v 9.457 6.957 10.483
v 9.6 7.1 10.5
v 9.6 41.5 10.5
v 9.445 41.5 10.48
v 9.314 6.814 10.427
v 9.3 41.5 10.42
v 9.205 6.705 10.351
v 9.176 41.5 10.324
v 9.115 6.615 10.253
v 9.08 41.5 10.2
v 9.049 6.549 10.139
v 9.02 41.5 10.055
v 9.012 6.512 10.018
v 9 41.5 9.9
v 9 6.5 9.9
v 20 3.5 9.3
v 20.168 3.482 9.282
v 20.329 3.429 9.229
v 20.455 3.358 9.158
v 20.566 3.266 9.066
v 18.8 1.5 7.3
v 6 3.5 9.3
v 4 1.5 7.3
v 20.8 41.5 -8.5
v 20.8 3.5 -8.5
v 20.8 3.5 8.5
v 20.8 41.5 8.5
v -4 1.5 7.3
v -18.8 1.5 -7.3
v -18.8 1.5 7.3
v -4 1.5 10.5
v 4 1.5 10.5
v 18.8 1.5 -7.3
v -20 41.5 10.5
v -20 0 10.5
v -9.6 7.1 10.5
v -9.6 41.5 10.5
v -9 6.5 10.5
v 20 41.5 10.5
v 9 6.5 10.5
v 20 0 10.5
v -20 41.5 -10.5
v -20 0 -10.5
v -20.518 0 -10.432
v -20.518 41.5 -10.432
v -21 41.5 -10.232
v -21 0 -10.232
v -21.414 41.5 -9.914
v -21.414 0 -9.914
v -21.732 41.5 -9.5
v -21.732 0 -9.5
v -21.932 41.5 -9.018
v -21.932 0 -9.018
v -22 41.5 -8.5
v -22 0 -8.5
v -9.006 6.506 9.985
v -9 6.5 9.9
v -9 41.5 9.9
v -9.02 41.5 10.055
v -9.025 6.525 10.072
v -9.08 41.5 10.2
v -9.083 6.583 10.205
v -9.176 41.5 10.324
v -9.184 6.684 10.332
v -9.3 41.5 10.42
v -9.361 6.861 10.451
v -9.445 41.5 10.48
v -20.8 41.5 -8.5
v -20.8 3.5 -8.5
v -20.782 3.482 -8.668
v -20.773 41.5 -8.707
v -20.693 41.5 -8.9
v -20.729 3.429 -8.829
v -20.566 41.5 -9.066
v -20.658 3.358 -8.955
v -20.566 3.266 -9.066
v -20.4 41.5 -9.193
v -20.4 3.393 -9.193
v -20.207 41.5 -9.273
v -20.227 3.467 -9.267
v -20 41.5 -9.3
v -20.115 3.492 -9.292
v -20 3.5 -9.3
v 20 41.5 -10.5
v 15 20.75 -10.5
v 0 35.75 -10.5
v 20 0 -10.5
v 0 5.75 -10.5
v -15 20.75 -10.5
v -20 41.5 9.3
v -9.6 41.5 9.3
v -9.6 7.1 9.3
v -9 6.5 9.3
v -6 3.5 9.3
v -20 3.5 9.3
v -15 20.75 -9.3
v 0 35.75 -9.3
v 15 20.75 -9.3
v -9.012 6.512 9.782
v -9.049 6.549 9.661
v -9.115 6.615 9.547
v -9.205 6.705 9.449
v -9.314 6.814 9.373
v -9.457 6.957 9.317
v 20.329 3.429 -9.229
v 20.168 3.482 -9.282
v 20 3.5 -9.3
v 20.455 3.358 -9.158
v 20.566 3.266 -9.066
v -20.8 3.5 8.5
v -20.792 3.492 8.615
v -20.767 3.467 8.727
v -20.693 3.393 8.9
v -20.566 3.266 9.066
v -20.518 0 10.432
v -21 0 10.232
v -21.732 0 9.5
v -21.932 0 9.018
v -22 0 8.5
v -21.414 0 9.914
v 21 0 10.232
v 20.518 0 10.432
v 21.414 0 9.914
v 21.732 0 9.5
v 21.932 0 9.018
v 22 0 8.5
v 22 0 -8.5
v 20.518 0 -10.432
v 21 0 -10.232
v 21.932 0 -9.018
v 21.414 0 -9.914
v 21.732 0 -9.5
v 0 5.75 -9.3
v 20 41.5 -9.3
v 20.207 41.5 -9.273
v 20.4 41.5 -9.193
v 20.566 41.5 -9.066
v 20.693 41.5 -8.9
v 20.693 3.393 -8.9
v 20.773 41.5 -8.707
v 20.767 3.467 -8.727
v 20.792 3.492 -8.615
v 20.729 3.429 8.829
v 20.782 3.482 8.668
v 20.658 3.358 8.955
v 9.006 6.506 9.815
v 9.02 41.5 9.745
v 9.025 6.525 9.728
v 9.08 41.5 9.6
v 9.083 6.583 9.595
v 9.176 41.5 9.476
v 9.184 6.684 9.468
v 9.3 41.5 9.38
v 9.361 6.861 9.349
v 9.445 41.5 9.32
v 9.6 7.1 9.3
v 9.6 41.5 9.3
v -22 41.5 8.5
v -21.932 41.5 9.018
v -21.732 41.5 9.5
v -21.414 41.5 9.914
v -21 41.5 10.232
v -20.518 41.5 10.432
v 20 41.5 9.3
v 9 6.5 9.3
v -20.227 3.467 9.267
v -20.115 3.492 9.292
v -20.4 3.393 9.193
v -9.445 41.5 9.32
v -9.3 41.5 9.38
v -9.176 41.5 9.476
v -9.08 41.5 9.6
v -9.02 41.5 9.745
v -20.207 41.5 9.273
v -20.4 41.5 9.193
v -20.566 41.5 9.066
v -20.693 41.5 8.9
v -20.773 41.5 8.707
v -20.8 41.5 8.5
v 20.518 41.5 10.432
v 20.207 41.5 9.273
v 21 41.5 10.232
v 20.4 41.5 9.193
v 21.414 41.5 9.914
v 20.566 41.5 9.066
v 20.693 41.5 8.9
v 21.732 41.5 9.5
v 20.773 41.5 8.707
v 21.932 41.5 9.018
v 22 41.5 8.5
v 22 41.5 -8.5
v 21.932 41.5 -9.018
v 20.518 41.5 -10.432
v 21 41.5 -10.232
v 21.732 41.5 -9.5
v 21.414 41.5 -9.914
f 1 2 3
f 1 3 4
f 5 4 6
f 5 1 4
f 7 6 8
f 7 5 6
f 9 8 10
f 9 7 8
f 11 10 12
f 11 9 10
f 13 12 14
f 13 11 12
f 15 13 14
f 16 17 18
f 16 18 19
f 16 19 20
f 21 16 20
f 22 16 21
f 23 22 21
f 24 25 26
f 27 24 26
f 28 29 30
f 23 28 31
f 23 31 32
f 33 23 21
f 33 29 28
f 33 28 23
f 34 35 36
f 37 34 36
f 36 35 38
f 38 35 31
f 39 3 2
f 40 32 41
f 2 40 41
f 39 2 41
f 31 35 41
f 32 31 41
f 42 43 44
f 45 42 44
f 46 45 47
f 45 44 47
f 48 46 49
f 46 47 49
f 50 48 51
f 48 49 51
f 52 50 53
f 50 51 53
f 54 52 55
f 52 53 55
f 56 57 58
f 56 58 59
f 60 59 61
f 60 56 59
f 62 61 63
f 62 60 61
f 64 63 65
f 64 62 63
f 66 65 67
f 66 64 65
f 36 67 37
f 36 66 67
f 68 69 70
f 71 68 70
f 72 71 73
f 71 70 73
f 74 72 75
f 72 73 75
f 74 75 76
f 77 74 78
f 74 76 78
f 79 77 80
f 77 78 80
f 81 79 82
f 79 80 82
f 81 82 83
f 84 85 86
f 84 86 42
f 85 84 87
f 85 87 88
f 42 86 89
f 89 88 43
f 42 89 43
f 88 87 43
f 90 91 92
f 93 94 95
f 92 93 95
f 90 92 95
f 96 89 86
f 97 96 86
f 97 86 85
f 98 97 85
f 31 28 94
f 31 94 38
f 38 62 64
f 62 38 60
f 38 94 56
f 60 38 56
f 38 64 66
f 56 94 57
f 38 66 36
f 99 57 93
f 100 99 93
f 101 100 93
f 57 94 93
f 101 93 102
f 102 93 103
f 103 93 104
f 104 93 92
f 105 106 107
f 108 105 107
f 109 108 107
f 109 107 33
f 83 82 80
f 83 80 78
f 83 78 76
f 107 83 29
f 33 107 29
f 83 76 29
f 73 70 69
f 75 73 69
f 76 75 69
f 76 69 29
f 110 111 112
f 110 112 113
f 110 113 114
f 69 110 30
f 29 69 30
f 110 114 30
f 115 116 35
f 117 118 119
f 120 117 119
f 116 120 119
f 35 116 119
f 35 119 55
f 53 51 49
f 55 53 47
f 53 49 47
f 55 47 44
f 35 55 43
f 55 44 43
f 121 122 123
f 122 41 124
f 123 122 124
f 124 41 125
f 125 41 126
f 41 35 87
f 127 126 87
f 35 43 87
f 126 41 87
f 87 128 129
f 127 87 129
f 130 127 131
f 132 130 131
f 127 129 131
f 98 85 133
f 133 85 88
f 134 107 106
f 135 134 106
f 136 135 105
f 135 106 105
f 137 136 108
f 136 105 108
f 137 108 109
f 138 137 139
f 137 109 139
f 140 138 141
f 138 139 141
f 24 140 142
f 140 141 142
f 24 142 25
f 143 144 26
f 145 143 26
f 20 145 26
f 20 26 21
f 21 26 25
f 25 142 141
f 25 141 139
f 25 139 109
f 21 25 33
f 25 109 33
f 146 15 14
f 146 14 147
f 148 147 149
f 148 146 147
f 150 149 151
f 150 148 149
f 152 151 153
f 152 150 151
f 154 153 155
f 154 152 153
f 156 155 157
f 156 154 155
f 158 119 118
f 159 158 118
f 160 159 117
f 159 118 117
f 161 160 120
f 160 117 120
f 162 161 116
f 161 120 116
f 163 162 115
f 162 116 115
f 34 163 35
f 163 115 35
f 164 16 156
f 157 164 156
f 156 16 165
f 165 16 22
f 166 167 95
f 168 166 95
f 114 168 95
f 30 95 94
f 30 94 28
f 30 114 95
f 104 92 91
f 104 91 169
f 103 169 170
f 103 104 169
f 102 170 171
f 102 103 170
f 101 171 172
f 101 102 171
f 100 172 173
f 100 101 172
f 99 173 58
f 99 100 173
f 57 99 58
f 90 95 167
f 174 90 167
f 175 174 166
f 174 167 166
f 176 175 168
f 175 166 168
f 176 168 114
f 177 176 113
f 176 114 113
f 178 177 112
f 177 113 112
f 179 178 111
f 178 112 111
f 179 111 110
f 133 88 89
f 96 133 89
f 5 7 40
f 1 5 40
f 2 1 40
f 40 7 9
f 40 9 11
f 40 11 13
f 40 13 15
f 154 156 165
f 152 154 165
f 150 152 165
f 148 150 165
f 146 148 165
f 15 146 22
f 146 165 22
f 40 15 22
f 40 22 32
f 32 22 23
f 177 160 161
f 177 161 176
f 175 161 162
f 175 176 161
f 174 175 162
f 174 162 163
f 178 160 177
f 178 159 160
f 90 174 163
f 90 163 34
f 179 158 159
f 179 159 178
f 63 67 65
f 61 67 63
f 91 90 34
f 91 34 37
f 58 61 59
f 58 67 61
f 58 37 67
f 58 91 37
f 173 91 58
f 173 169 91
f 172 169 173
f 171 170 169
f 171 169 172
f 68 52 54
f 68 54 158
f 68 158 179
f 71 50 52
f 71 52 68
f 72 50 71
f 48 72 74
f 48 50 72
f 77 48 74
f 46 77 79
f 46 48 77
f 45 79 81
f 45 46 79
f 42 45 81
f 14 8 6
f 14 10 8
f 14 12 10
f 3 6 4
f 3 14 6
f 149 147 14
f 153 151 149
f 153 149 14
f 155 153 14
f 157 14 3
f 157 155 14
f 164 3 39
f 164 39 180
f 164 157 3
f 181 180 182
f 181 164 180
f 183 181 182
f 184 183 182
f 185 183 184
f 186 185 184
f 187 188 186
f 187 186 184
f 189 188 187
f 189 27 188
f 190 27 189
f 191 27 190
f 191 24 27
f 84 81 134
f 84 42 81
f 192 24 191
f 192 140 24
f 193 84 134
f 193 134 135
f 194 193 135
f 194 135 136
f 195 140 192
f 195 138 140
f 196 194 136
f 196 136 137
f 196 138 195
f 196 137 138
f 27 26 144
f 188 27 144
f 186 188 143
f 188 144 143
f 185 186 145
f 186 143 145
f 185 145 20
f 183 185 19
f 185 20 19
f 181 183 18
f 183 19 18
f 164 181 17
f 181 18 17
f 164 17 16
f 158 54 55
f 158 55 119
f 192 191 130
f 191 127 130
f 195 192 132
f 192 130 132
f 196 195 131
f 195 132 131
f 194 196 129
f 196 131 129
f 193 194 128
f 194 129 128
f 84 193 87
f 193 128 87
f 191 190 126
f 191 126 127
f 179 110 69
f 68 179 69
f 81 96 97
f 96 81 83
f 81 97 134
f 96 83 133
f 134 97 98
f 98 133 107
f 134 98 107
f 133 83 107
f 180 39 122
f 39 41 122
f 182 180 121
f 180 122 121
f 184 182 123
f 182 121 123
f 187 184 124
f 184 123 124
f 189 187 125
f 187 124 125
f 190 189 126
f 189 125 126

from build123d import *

# Parameters (mm, degrees)
RESSALTO_EXTRUS_O1_DEPTH = 1.5
RESSALTO_EXTRUS_O2_DEPTH = 40
ESBO_O4_W                = 18
ESBO_O4_H                = 3
CORTE_EXTRUS_O1_DEPTH    = 40
CORTE_EXTRUS_O2_DEPTH    = 8
CHANFRO1_SIZE            = 5
CHANFRO2_SIZE            = 2
FILETE2_START            = 6.5
FILETE2_DEPTH            = 35.5
FILETE2_START_2          = -3
FILETE2_2_DEPTH          = 1.232233047
FILETE3_START            = 6.5
FILETE3_DEPTH            = 35.5
FILETE3_START_2          = 1.767766953
FILETE3_2_DEPTH          = 1.232233047


with BuildPart() as part:
    # Esboço1 → Ressalto-extrusão1 (new body)
    with BuildSketch(Plane(origin=(0, 0, 0), x_dir=(1, 0, 0), z_dir=(0, 1, 0))):
        with BuildLine():
            Line((-20, -10.5), (20, -10.5))
            ThreePointArc((20, -10.5), (21.414213562, -9.914213562), (22, -8.5))
            Line((22, -8.5), (22, 8.5))
            ThreePointArc((22, 8.5), (21.414213562, 9.914213562), (20, 10.5))
            Line((20, 10.5), (-20, 10.5))
            ThreePointArc((-20, 10.5), (-21.414213562, 9.914213562), (-22, 8.5))
            Line((-22, 8.5), (-22, -8.5))
            ThreePointArc((-22, -8.5), (-21.414213562, -9.914213562), (-20, -10.5))
        make_face()
    extrude(amount=RESSALTO_EXTRUS_O1_DEPTH)

    # Esboço3 → Ressalto-extrusão2 (add)
    with BuildSketch(Plane(origin=(0, 1.5, 0), x_dir=(1, 0, 0), z_dir=(0, 1, 0))):
        with BuildLine():
            Line((-20, -10.5), (20, -10.5))
            ThreePointArc((20, -10.5), (21.414213562, -9.914213562), (22, -8.5))
            Line((22, -8.5), (22, 8.5))
            ThreePointArc((22, 8.5), (21.414213562, 9.914213562), (20, 10.5))
            Line((20, 10.5), (-20, 10.5))
            ThreePointArc((-20, 10.5), (-21.414213562, 9.914213562), (-22, 8.5))
            Line((-22, 8.5), (-22, -8.5))
            ThreePointArc((-22, -8.5), (-21.414213562, -9.914213562), (-20, -10.5))
        make_face()
        with BuildLine():
            Line((-20, 9.3), (20, 9.3))
            ThreePointArc((20, 9.3), (20.565685425, 9.065685425), (20.8, 8.5))
            Line((20.8, 8.5), (20.8, -8.5))
            ThreePointArc((20.8, -8.5), (20.565685425, -9.065685425), (20, -9.3))
            Line((20, -9.3), (-20, -9.3))
            ThreePointArc((-20, -9.3), (-20.565685425, -9.065685425), (-20.8, -8.5))
            Line((-20.8, -8.5), (-20.8, 8.5))
            ThreePointArc((-20.8, 8.5), (-20.565685425, 9.065685425), (-20, 9.3))
        make_face(mode=Mode.SUBTRACT)
    extrude(amount=RESSALTO_EXTRUS_O2_DEPTH)

    # Esboço4 → Corte-extrusão1 (cut)
    with BuildSketch(Plane(origin=(0, 41.5, 0), x_dir=(1, 0, 0), z_dir=(0, 1, 0))):
        with Locations((0, -9.3)):
            Rectangle(ESBO_O4_W, ESBO_O4_H)
    extrude(amount=-CORTE_EXTRUS_O1_DEPTH, mode=Mode.SUBTRACT)

    # Esboço5 → Corte-extrusão2 (cut)
    with BuildSketch(Plane(origin=(0, 0, -10.5), x_dir=(-1, 0, 0), z_dir=(0, 0, -1))):
        Polygon((0, 5.75), (15, 20.75), (0, 35.75), (-15, 20.75), align=None)
    extrude(amount=-CORTE_EXTRUS_O2_DEPTH, mode=Mode.SUBTRACT)

    # Chanfro1
    chanfro1_edges = [part.edges().sort_by_distance(p)[0] for p in [
        (9, 1.5, 9.9),
        (-9, 1.5, 9.9),
    ]]
    chamfer(chanfro1_edges, length=CHANFRO1_SIZE)

    # Chanfro2
    # the kernel refuses this chamfer: 2 mm, written as the material it adds along each edge
    with BuildSketch(Plane(origin=(-1.143365976, 1.5, 9.3), x_dir=(0, 1, 0), z_dir=(1, 0, 0))) as chanfro2_piece_1_section:
        Polygon((CHANFRO2_SIZE, 0), (0, -CHANFRO2_SIZE), (0, 0), align=None)
    chanfro2_piece_1 = extrude(amount=26.286731952, mode=Mode.PRIVATE)
    chanfro2_piece_1 = split(chanfro2_piece_1, bisect_by=Plane(origin=(20.8, 1.5, 9.3), z_dir=(-1, 0, 0)), keep=Keep.TOP, mode=Mode.PRIVATE)
    chanfro2_piece_1 = split(chanfro2_piece_1, bisect_by=Plane(origin=(1.428317012, -1.071682988, 9.3), z_dir=(0.7071067811865476, -0.7071067811865476, 0)), keep=Keep.TOP, mode=Mode.PRIVATE)
    add(chanfro2_piece_1)
    with BuildSketch(Plane(origin=(20.8, 1.5, -13.643365976), x_dir=(0, 1, 0), z_dir=(0, 0, 1))) as chanfro2_piece_2_section:
        Polygon((CHANFRO2_SIZE, 0), (0, CHANFRO2_SIZE), (0, 0), align=None)
    chanfro2_piece_2 = extrude(amount=27.286731952, mode=Mode.PRIVATE)
    chanfro2_piece_2 = split(chanfro2_piece_2, bisect_by=Plane(origin=(20.8, 1.5, -9.3), z_dir=(0, 0, 1)), keep=Keep.TOP, mode=Mode.PRIVATE)
    chanfro2_piece_2 = split(chanfro2_piece_2, bisect_by=Plane(origin=(20.8, 1.5, 9.3), z_dir=(0, 0, -1)), keep=Keep.TOP, mode=Mode.PRIVATE)
    add(chanfro2_piece_2)
    with BuildSketch(Plane(origin=(-25.143365976, 1.5, 9.3), x_dir=(0, 1, 0), z_dir=(1, 0, 0))) as chanfro2_piece_3_section:
        Polygon((CHANFRO2_SIZE, 0), (0, -CHANFRO2_SIZE), (0, 0), align=None)
    chanfro2_piece_3 = extrude(amount=26.286731952, mode=Mode.PRIVATE)
    chanfro2_piece_3 = split(chanfro2_piece_3, bisect_by=Plane(origin=(-20.8, 1.5, 9.3), z_dir=(1, 0, 0)), keep=Keep.TOP, mode=Mode.PRIVATE)
    chanfro2_piece_3 = split(chanfro2_piece_3, bisect_by=Plane(origin=(-14.571682988, 12.071682988, 9.3), z_dir=(-0.7071067811865476, -0.7071067811865476, 0)), keep=Keep.TOP, mode=Mode.PRIVATE)
    add(chanfro2_piece_3)
    with BuildSketch(Plane(origin=(-20.8, 1.5, 13.643365976), x_dir=(0, 1, 0), z_dir=(0, 0, -1))) as chanfro2_piece_4_section:
        Polygon((CHANFRO2_SIZE, 0), (0, CHANFRO2_SIZE), (0, 0), align=None)
    chanfro2_piece_4 = extrude(amount=27.286731952, mode=Mode.PRIVATE)
    chanfro2_piece_4 = split(chanfro2_piece_4, bisect_by=Plane(origin=(-20.8, 1.5, -9.3), z_dir=(0, 0, 1)), keep=Keep.TOP, mode=Mode.PRIVATE)
    chanfro2_piece_4 = split(chanfro2_piece_4, bisect_by=Plane(origin=(-20.8, 1.5, 9.3), z_dir=(0, 0, -1)), keep=Keep.TOP, mode=Mode.PRIVATE)
    add(chanfro2_piece_4)
    with BuildSketch(Plane(origin=(-25.143365976, 1.5, -9.3), x_dir=(0, 1, 0), z_dir=(1, 0, 0))) as chanfro2_piece_5_section:
        Polygon((CHANFRO2_SIZE, 0), (0, CHANFRO2_SIZE), (0, 0), align=None)
    chanfro2_piece_5 = extrude(amount=50.286731952, mode=Mode.PRIVATE)
    chanfro2_piece_5 = split(chanfro2_piece_5, bisect_by=Plane(origin=(20.8, 1.5, -9.3), z_dir=(-1, 0, 0)), keep=Keep.TOP, mode=Mode.PRIVATE)
    chanfro2_piece_5 = split(chanfro2_piece_5, bisect_by=Plane(origin=(-20.8, 1.5, -9.3), z_dir=(1, 0, 0)), keep=Keep.TOP, mode=Mode.PRIVATE)
    add(chanfro2_piece_5)
    with BuildSketch(Plane(origin=(-20, 1.5, -8.5), x_dir=(-1, 0, 0), z_dir=(0, 0, 1))) as chanfro2_piece_6_section:
        Polygon((0.8, -CHANFRO2_SIZE), (0, -1.2), (0, 0), (0.8, 0), align=None)
    chanfro2_piece_6 = revolve(axis=Axis((-20, 1.5, -8.5), (0, -1, 0)), revolution_arc=90, mode=Mode.PRIVATE)
    chanfro2_piece_6 = split(chanfro2_piece_6, bisect_by=Plane(origin=(-19.4, 2.1, -8.5), z_dir=(-0.7071067811865476, -0.7071067811865476, 0)), keep=Keep.TOP, mode=Mode.PRIVATE)
    add(chanfro2_piece_6)
    with BuildSketch(Plane(origin=(-20, 1.5, -8.5), x_dir=(-1, 0, 0), z_dir=(0, 0, 1))) as chanfro2_piece_7_section:
        Polygon((0.8, -CHANFRO2_SIZE), (0, -1.2), (0, 0), (0.8, 0), align=None)
    chanfro2_piece_7 = revolve(axis=Axis((-20, 1.5, -8.5), (0, -1, 0)), revolution_arc=90, mode=Mode.PRIVATE)
    chanfro2_piece_7 = split(chanfro2_piece_7, bisect_by=Plane(origin=(-20, 2.1, -7.9), z_dir=(0, -0.7071067811865476, -0.7071067811865476)), keep=Keep.TOP, mode=Mode.PRIVATE)
    add(chanfro2_piece_7)
    with BuildSketch(Plane(origin=(20, 1.5, -8.5), x_dir=(0, 0, -1), z_dir=(-1, 0, 0))) as chanfro2_piece_8_section:
        Polygon((0.8, -CHANFRO2_SIZE), (0, -1.2), (0, 0), (0.8, 0), align=None)
    chanfro2_piece_8 = revolve(axis=Axis((20, 1.5, -8.5), (0, -1, 0)), revolution_arc=90, mode=Mode.PRIVATE)
    chanfro2_piece_8 = split(chanfro2_piece_8, bisect_by=Plane(origin=(20, 2.1, -7.9), z_dir=(0, -0.7071067811865476, -0.7071067811865476)), keep=Keep.TOP, mode=Mode.PRIVATE)
    add(chanfro2_piece_8)
    with BuildSketch(Plane(origin=(20, 1.5, -8.5), x_dir=(0, 0, -1), z_dir=(-1, 0, 0))) as chanfro2_piece_9_section:
        Polygon((0.8, -CHANFRO2_SIZE), (0, -1.2), (0, 0), (0.8, 0), align=None)
    chanfro2_piece_9 = revolve(axis=Axis((20, 1.5, -8.5), (0, -1, 0)), revolution_arc=90, mode=Mode.PRIVATE)
    chanfro2_piece_9 = split(chanfro2_piece_9, bisect_by=Plane(origin=(19.4, 2.1, -8.5), z_dir=(0.7071067811865476, -0.7071067811865476, 0)), keep=Keep.TOP, mode=Mode.PRIVATE)
    add(chanfro2_piece_9)
    with BuildSketch(Plane(origin=(-20, 1.5, 8.5), x_dir=(0, 0, 1), z_dir=(1, 0, 0))) as chanfro2_piece_10_section:
        Polygon((0.8, -CHANFRO2_SIZE), (0, -1.2), (0, 0), (0.8, 0), align=None)
    chanfro2_piece_10 = revolve(axis=Axis((-20, 1.5, 8.5), (0, -1, 0)), revolution_arc=90, mode=Mode.PRIVATE)
    chanfro2_piece_10 = split(chanfro2_piece_10, bisect_by=Plane(origin=(-20, 2.1, 7.9), z_dir=(0, -0.7071067811865476, 0.7071067811865476)), keep=Keep.TOP, mode=Mode.PRIVATE)
    add(chanfro2_piece_10)
    with BuildSketch(Plane(origin=(-20, 1.5, 8.5), x_dir=(0, 0, 1), z_dir=(1, 0, 0))) as chanfro2_piece_11_section:
        Polygon((0.8, -CHANFRO2_SIZE), (0, -1.2), (0, 0), (0.8, 0), align=None)
    chanfro2_piece_11 = revolve(axis=Axis((-20, 1.5, 8.5), (0, -1, 0)), revolution_arc=90, mode=Mode.PRIVATE)
    chanfro2_piece_11 = split(chanfro2_piece_11, bisect_by=Plane(origin=(-19.4, 2.1, 8.5), z_dir=(-0.7071067811865476, -0.7071067811865476, 0)), keep=Keep.TOP, mode=Mode.PRIVATE)
    add(chanfro2_piece_11)
    with BuildSketch(Plane(origin=(20, 1.5, 8.5), x_dir=(1, 0, 0), z_dir=(0, 0, -1))) as chanfro2_piece_12_section:
        Polygon((0.8, -CHANFRO2_SIZE), (0, -1.2), (0, 0), (0.8, 0), align=None)
    chanfro2_piece_12 = revolve(axis=Axis((20, 1.5, 8.5), (0, -1, 0)), revolution_arc=90, mode=Mode.PRIVATE)
    chanfro2_piece_12 = split(chanfro2_piece_12, bisect_by=Plane(origin=(19.4, 2.1, 8.5), z_dir=(0.7071067811865476, -0.7071067811865476, 0)), keep=Keep.TOP, mode=Mode.PRIVATE)
    add(chanfro2_piece_12)
    with BuildSketch(Plane(origin=(20, 1.5, 8.5), x_dir=(1, 0, 0), z_dir=(0, 0, -1))) as chanfro2_piece_13_section:
        Polygon((0.8, -CHANFRO2_SIZE), (0, -1.2), (0, 0), (0.8, 0), align=None)
    chanfro2_piece_13 = revolve(axis=Axis((20, 1.5, 8.5), (0, -1, 0)), revolution_arc=90, mode=Mode.PRIVATE)
    chanfro2_piece_13 = split(chanfro2_piece_13, bisect_by=Plane(origin=(20, 2.1, 7.9), z_dir=(0, -0.7071067811865476, 0.7071067811865476)), keep=Keep.TOP, mode=Mode.PRIVATE)
    add(chanfro2_piece_13)

    # Filete2: read off the stored shape, not the designer's step
    # Filete2 outline → Filete2 (cut)
    with BuildSketch(Plane(origin=(0, 0, 0), x_dir=(1, 0, 0), z_dir=(0, 1, 0)).offset(FILETE2_START)):
        with BuildLine():
            ThreePointArc((-9.6, -9.3), (-9.175735931, -9.475735931), (-9, -9.9))
            Line((-9, -9.9), (-9, -9.3))
            Line((-9, -9.3), (-9.6, -9.3))
        make_face()
        with BuildLine():
            ThreePointArc((-9, -9.9), (-9.175735931, -10.324264069), (-9.6, -10.5))
            Line((-9.6, -10.5), (-9, -10.5))
            Line((-9, -10.5), (-9, -9.9))
        make_face()
    extrude(amount=FILETE2_DEPTH, mode=Mode.SUBTRACT)

    # Filete2 2 outline → Filete2 2 (add)
    with BuildSketch(Plane(origin=(0, 0, 0), x_dir=(0.7071067811865509, -0.707106781186544, 0), z_dir=(0.707106781186544, 0.707106781186551, 0)).offset(FILETE2_START_2)):
        with BuildLine():
            Line((-3.889087297, -7.3), (-6.717514421, -9.3))
            Line((-6.717514421, -9.3), (-11.808683246, -9.3))
            add(Edge.make_bspline(
                [(-11.808683246, -10.5), (-10.960155108, -10.5), (-10.960155108, -9.9), (-10.960155108, -9.3), (-11.808683246, -9.3)],
                knots=[1.570796327, 1.570796327, 1.570796327, 3.141592654, 3.141592654, 4.71238898, 4.71238898, 4.71238898], degree=2, weights=[1, 0.707106781, 1, 0.707106781, 1]))
            Line((-11.808683246, -10.5), (-3.889087297, -10.5))
            Line((-3.889087297, -10.5), (-3.889087297, -7.3))
        make_face()
    extrude(amount=FILETE2_2_DEPTH)

    # Filete3: read off the stored shape, not the designer's step
    # Filete3 outline → Filete3 (cut)
    with BuildSketch(Plane(origin=(0, 0, 0), x_dir=(1, 0, 0), z_dir=(0, 1, 0)).offset(FILETE3_START)):
        with BuildLine():
            Line((9, -10.5), (9.6, -10.5))
            ThreePointArc((9.6, -10.5), (9.175735931, -10.324264069), (9, -9.9))
            Line((9, -9.9), (9, -10.5))
        make_face()
        with BuildLine():
            Line((9, -9.3), (9, -9.9))
            ThreePointArc((9, -9.9), (9.175735931, -9.475735931), (9.6, -9.3))
            Line((9.6, -9.3), (9, -9.3))
        make_face()
    extrude(amount=FILETE3_DEPTH, mode=Mode.SUBTRACT)

    # Filete3 2 outline → Filete3 2 (add)
    with BuildSketch(Plane(origin=(0, 0, 0), x_dir=(0.7071067811865509, 0.707106781186544, 0), z_dir=(0.707106781186544, -0.707106781186551, 0)).offset(FILETE3_START_2)):
        with BuildLine():
            Line((11.808683246, 10.5), (3.889087297, 10.5))
            Line((3.889087297, 10.5), (3.889087297, 7.3))
            Line((3.889087297, 7.3), (6.717514421, 9.3))
            Line((6.717514421, 9.3), (11.808683246, 9.3))
            add(Edge.make_bspline(
                [(11.808683246, 9.3), (10.960155108, 9.3), (10.960155108, 9.9), (10.960155108, 10.5), (11.808683246, 10.5)],
                knots=[4.71238898, 4.71238898, 4.71238898, 6.283185307, 6.283185307, 7.853981634, 7.853981634, 7.853981634], degree=2, weights=[1, 0.707106781, 1, 0.707106781, 1]))
        make_face()
    extrude(amount=FILETE3_2_DEPTH)


solid = part.part
